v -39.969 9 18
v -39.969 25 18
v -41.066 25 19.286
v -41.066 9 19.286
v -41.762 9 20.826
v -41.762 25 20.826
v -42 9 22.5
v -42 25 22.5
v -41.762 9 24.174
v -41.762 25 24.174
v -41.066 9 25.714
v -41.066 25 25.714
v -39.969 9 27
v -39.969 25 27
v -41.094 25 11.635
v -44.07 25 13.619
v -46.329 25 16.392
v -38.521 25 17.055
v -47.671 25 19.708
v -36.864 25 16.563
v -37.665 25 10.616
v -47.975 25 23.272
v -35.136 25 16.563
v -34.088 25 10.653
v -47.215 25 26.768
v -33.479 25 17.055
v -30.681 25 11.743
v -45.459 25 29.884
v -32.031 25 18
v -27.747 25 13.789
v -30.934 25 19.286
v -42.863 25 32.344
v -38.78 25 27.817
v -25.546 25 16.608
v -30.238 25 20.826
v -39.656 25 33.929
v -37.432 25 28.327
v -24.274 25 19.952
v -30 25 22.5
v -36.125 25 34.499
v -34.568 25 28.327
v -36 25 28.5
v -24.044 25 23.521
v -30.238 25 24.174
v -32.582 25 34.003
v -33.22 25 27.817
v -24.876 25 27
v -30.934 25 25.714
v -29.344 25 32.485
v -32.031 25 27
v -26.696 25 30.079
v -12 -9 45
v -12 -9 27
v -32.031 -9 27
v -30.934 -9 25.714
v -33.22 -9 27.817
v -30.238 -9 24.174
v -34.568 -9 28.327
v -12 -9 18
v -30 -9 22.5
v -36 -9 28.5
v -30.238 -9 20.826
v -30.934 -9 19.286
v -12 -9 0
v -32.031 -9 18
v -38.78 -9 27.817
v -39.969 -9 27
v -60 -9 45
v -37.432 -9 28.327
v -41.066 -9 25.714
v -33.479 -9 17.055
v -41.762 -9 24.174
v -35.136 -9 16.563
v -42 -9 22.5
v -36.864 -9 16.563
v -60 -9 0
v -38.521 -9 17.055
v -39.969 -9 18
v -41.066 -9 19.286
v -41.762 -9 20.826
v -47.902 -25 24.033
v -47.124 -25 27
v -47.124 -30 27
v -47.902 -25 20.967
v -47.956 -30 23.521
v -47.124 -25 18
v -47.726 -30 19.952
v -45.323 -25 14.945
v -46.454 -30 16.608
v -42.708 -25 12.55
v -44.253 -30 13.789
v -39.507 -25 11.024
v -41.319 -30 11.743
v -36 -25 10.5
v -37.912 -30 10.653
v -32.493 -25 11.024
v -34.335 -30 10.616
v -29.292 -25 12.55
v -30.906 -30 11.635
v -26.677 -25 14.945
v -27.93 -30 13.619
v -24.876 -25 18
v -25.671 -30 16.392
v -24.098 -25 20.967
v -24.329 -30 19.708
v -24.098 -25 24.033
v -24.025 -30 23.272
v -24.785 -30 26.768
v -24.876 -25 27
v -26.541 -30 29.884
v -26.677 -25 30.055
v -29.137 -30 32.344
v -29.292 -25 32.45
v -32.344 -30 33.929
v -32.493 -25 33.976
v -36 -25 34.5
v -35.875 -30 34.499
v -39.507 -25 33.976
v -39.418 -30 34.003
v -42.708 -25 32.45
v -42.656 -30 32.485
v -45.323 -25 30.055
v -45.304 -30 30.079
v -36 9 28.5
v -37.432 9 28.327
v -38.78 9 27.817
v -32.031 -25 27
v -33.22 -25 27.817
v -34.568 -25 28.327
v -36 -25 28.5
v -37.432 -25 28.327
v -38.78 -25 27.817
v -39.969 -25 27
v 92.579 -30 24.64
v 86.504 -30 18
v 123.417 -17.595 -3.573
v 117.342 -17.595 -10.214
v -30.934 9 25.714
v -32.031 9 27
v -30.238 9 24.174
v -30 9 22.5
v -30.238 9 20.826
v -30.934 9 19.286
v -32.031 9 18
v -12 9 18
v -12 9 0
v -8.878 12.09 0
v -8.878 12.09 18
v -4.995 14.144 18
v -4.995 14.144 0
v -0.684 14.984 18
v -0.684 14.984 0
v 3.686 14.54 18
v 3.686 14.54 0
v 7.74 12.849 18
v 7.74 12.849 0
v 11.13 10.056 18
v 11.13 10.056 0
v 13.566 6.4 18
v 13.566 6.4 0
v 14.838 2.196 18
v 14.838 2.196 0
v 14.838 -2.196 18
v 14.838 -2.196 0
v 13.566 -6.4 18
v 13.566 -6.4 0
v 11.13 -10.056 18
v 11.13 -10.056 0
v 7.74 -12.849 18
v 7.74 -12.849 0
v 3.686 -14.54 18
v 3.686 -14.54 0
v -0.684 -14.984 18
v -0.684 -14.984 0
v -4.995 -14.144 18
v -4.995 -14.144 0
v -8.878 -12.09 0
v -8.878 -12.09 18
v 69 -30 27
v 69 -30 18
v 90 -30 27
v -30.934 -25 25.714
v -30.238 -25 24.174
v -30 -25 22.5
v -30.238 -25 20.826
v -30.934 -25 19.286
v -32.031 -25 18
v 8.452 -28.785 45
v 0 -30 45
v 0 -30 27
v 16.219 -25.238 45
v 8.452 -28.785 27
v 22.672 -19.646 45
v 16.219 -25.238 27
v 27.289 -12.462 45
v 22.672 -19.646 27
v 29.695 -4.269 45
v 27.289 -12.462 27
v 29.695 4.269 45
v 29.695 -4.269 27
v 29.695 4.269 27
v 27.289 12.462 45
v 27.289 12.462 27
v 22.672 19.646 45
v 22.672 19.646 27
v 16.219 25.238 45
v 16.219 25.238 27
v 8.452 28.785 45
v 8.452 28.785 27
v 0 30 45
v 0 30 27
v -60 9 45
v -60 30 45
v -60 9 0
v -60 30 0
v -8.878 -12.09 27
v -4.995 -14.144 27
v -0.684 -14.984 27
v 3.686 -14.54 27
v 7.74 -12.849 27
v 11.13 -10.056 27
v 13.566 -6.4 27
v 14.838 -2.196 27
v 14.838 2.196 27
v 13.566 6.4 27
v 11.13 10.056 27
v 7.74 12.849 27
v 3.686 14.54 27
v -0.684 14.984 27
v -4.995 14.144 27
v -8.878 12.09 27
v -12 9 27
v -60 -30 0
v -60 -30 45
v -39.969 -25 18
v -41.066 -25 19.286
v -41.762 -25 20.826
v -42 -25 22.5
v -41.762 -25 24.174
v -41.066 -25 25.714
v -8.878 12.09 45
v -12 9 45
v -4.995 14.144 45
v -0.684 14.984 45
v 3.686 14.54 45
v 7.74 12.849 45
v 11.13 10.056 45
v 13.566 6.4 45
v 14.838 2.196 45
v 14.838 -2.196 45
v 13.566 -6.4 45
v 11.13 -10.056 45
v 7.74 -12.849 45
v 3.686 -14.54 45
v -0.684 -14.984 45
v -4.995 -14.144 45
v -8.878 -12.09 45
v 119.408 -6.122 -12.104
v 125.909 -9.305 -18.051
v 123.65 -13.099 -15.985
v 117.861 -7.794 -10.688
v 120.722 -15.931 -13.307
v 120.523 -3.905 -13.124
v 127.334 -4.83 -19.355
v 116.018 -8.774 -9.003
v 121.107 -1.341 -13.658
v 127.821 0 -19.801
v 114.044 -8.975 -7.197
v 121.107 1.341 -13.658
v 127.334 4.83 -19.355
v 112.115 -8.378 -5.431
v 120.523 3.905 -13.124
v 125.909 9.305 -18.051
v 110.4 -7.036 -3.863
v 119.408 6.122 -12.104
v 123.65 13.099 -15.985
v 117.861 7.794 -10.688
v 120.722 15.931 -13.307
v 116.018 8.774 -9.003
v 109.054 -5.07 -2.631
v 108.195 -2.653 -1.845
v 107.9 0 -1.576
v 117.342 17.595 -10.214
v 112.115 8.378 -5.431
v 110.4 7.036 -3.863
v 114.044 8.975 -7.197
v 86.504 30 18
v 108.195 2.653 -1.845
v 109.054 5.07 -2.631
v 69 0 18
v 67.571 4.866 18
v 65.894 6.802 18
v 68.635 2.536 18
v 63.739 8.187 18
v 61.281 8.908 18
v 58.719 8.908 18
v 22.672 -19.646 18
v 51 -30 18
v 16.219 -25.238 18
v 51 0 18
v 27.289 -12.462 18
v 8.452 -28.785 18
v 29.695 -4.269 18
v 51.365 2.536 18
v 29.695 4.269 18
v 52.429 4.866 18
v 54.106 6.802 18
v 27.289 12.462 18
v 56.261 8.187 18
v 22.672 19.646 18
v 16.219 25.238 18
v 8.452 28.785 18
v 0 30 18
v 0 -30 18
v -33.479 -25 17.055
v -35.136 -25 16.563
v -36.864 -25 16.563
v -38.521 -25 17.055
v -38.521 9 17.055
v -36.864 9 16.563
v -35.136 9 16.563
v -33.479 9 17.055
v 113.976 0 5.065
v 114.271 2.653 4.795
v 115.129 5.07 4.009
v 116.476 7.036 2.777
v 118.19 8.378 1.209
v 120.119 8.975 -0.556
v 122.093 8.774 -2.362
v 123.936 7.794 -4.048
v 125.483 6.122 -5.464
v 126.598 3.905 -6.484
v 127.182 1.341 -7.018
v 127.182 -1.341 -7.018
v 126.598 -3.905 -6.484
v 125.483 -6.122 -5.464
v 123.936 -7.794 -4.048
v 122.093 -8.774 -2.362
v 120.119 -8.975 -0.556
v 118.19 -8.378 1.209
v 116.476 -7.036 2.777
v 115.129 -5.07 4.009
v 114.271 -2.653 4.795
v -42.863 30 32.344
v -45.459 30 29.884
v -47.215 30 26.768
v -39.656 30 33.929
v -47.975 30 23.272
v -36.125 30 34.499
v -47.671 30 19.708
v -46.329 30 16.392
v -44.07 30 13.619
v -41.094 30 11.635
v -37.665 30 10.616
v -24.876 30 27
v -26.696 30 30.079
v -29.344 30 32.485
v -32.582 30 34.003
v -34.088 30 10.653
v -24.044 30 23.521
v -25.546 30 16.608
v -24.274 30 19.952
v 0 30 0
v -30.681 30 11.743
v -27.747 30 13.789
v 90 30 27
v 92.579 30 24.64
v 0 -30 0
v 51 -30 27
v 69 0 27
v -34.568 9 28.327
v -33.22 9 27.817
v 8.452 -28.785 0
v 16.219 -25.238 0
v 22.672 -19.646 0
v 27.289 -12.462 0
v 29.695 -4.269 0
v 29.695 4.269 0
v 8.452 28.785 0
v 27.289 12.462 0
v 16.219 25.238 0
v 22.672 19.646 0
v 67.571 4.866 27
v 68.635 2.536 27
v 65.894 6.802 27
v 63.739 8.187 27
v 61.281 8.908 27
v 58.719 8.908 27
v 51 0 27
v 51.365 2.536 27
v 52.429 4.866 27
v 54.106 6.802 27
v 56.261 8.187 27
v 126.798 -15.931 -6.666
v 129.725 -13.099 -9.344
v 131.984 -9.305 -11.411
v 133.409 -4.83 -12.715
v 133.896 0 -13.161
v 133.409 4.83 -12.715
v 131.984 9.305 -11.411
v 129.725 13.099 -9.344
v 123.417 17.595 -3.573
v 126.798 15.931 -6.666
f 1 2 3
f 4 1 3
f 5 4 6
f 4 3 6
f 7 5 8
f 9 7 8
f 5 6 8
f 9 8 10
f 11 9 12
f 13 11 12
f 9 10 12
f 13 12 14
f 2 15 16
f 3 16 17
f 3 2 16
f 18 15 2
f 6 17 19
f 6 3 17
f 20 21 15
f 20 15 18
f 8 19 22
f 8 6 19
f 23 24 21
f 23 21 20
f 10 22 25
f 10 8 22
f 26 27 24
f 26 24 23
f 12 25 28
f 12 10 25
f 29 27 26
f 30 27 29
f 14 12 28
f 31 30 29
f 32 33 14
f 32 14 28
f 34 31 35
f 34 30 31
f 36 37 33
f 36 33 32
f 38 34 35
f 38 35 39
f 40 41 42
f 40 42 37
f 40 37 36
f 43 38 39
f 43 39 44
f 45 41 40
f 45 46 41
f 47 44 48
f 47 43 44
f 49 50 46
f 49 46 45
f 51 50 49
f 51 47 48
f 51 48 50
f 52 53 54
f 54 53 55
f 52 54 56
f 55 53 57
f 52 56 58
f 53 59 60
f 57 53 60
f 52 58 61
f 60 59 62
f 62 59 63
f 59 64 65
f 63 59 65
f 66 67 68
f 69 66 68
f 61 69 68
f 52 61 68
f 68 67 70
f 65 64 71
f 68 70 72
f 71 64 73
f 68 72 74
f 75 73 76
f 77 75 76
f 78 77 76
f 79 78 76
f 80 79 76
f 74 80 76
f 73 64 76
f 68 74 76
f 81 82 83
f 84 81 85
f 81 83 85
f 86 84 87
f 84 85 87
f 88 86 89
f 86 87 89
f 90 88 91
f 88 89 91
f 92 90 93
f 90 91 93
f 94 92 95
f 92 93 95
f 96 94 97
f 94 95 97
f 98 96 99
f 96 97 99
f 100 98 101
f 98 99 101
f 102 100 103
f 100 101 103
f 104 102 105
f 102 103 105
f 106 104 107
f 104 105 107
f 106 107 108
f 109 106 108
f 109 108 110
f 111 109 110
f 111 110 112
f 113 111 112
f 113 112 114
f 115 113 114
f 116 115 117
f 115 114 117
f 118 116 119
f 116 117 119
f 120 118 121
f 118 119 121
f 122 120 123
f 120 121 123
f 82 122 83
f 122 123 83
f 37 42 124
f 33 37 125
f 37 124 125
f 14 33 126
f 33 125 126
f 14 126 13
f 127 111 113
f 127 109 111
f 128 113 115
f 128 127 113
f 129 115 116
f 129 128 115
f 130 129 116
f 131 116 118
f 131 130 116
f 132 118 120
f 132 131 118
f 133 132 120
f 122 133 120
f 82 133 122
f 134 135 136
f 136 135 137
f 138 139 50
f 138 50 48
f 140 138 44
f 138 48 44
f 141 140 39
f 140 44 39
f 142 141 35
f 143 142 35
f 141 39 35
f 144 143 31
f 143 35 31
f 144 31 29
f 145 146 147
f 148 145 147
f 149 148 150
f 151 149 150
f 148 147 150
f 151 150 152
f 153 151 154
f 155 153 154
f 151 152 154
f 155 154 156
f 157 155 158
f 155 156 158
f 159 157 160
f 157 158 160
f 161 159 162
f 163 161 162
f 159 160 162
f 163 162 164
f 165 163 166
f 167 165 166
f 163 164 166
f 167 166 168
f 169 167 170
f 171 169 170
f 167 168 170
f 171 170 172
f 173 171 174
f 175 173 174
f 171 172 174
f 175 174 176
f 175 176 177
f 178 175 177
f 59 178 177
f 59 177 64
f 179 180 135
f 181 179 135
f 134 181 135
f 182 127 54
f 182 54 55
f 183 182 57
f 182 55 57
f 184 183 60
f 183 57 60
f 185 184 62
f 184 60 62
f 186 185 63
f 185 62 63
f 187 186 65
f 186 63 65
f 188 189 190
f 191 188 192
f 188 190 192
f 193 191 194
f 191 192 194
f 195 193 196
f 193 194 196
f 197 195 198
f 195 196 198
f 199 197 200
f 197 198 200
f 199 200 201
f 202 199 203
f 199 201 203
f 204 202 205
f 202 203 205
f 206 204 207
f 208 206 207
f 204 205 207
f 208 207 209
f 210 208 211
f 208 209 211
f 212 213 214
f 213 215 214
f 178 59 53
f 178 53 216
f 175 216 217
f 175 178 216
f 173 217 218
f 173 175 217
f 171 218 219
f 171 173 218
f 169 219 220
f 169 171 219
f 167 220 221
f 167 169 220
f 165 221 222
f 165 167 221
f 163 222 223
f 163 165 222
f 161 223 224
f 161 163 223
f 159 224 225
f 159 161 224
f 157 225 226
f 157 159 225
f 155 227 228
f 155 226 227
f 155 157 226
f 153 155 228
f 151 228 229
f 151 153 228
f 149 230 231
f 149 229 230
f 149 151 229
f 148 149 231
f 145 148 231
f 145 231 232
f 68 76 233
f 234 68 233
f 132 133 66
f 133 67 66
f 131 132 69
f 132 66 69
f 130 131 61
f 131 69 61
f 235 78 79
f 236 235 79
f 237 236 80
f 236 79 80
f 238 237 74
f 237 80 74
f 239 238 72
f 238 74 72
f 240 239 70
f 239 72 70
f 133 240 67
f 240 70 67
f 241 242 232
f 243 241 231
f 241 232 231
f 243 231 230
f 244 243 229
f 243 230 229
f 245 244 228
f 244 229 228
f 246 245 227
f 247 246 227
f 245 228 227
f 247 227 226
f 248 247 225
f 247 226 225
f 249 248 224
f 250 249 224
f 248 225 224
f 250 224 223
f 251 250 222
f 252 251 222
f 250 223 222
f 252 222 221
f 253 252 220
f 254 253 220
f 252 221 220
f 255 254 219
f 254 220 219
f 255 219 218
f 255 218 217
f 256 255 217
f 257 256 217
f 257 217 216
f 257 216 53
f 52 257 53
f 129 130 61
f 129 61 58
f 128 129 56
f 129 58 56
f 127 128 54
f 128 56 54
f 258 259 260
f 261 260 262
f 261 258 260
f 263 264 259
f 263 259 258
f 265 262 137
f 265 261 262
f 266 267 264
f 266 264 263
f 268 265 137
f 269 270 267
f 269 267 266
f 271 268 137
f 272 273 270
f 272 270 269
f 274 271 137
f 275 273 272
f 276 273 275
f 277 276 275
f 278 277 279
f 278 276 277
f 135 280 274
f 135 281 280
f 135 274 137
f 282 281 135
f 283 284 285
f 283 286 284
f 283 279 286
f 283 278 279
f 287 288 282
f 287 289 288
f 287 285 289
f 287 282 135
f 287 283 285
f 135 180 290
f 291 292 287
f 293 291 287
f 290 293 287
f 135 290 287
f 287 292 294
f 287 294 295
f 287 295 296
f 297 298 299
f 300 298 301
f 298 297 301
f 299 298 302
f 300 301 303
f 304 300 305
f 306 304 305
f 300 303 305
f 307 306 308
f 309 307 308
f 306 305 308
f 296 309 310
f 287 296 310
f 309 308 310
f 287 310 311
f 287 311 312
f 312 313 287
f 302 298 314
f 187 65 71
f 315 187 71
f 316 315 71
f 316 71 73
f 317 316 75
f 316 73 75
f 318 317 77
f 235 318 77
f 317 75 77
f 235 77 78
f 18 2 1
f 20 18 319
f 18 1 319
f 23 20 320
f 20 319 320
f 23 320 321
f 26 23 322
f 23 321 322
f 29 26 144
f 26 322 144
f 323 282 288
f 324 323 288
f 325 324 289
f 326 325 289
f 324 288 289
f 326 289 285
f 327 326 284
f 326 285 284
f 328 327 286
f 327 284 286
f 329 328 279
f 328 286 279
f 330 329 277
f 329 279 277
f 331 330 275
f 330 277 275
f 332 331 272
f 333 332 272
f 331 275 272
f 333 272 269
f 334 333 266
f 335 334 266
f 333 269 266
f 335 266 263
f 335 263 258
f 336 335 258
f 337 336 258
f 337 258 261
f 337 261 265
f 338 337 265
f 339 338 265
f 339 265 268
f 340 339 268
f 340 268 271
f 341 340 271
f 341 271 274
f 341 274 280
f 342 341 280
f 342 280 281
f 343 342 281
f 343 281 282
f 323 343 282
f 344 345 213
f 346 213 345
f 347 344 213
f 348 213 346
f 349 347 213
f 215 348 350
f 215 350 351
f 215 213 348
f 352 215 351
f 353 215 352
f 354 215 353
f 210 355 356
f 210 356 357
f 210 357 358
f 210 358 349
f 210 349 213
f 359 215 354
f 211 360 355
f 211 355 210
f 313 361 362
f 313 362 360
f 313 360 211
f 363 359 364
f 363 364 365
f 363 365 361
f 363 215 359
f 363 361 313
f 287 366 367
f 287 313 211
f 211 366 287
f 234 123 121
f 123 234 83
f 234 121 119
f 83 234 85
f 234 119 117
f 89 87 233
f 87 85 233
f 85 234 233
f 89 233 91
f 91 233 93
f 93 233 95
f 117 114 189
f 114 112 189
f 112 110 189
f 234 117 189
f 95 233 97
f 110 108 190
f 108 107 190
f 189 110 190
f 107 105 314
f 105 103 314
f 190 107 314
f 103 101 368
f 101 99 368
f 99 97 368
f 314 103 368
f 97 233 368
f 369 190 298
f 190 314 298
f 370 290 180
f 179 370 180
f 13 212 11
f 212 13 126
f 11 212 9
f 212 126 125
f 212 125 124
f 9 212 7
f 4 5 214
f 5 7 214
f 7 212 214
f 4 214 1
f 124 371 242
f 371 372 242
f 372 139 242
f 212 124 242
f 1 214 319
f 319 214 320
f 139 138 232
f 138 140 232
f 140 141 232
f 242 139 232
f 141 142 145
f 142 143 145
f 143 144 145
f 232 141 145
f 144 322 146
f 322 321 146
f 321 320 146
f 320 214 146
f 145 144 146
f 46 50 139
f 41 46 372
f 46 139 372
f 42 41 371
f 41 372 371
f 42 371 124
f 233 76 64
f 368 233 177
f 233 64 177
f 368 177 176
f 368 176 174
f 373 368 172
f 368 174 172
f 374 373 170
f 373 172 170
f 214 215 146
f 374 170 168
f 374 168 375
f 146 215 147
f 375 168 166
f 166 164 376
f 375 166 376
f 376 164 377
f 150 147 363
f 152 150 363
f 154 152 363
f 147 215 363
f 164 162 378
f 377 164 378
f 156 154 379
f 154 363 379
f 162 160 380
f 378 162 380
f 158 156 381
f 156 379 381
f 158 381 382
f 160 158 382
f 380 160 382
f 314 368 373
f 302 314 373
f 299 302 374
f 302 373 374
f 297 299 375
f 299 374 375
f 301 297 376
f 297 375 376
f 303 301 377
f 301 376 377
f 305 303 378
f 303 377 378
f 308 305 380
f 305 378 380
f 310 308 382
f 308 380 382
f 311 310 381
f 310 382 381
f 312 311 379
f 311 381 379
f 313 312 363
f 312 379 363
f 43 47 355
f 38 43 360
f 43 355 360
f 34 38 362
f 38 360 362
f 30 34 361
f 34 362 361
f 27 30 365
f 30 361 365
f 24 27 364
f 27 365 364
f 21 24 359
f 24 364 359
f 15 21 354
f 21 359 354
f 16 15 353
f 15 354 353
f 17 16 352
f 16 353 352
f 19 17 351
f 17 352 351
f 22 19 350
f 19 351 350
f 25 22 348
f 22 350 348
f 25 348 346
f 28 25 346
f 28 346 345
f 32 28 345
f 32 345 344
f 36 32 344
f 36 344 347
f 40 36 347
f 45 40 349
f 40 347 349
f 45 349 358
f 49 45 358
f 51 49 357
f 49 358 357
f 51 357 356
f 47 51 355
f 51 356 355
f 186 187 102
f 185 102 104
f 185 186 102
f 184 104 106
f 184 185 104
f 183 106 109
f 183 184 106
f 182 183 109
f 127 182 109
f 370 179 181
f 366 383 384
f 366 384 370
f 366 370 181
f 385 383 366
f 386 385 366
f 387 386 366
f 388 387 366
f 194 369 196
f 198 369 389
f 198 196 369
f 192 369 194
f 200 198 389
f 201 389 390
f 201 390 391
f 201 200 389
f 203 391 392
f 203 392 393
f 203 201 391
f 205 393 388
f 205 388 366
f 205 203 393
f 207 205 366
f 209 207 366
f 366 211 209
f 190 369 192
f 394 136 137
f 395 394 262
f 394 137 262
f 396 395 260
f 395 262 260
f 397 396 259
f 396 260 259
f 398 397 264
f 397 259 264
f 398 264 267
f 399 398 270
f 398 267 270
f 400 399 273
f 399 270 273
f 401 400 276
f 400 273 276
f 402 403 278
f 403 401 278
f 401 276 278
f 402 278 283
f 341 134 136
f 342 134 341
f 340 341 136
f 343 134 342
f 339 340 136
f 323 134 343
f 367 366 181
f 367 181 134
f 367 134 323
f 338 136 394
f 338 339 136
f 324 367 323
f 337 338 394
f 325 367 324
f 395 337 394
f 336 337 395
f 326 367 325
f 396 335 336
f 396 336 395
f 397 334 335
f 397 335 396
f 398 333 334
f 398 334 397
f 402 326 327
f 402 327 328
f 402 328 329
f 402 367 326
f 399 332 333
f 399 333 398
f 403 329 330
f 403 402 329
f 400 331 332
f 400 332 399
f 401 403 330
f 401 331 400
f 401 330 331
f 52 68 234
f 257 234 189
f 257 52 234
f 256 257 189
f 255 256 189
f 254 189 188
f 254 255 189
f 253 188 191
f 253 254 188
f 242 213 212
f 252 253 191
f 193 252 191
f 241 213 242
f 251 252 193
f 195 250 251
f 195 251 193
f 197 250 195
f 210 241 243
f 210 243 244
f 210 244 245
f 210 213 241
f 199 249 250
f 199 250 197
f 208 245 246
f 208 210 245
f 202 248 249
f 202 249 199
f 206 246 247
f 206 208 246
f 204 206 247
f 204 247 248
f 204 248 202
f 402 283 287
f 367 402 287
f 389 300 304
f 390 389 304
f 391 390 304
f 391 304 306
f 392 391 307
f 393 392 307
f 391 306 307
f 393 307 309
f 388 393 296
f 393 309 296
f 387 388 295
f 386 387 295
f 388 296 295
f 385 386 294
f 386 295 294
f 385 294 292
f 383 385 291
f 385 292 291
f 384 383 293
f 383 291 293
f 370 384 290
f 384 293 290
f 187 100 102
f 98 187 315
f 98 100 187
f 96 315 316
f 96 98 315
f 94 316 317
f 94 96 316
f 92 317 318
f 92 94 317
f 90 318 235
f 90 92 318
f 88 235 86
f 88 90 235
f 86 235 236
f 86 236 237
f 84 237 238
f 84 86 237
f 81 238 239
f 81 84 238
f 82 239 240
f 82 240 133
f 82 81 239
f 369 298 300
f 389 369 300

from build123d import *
from build123d.topology import SkipClean

# Parameters (mm, degrees)
BOSS_EXTRUDE1_DEPTH                      = 45
CBORE_FOR_M10_HEX_HEAD_BOLT1_D           = 12
CBORE_FOR_M10_HEX_HEAD_BOLT1_DEPTH       = 21
CBORE_FOR_M10_HEX_HEAD_BOLT1_CBORE_D     = 24
CBORE_FOR_M10_HEX_HEAD_BOLT1_CBORE_DEPTH = 5
CBORE_FOR_M10_HEX_HEAD_BOLT1_TIP         = 3.605163714
CBORE_FOR_M10_HEX_HEAD_BOLT2_D           = 12
CBORE_FOR_M10_HEX_HEAD_BOLT2_CBORE_D     = 24
CBORE_FOR_M10_HEX_HEAD_BOLT2_CBORE_DEPTH = 5
SKETCH8_W                                = 9
SKETCH8_H                                = 60
BOSS_EXTRUDE5_DEPTH                      = 150
SKETCH11_R                               = 12
CUT_EXTRUDE3_DEPTH                       = 5
SKETCH13_R                               = 6
CUT_EXTRUDE4_DEPTH                       = 99
SKETCH14_R                               = 12
CUT_EXTRUDE5_DEPTH                       = 5
CUT_EXTRUDE6_START                       = -68
CUT_EXTRUDE6_DEPTH                       = 68
BOSS_EXTRUDE8_DEPTH                      = 60
CUT_EXTRUDE7_DEPTH                       = 68
SKETCH18_R                               = 9
CUT_EXTRUDE8_DEPTH                       = 68
CUT_EXTRUDE9_DEPTH                       = 68


with BuildPart() as part:
    # Sketch1 → Boss-Extrude1 (new body)
    with BuildSketch(Plane.XY):
        with BuildLine():
            Line((0, 30), (-60, 30))
            Line((-60, 30), (-60, 9))
            Line((-60, 9), (-12, 9))
            ThreePointArc((-12, 9), (15, 0), (-12, -9))
            Line((-12, -9), (-60, -9))
            Line((-60, -9), (-60, -30))
            Line((-60, -30), (0, -30))
            ThreePointArc((0, -30), (30, 0), (0, 30))
        make_face()
    extrude(amount=BOSS_EXTRUDE1_DEPTH)

    # CBORE for M10 Hex Head Bolt1
    with Locations(Plane(origin=(0, 30, 0), x_dir=(1, 0, 0), z_dir=(0, 1, 0))):
        with Locations((-36, -22.5)):
            CounterBoreHole(CBORE_FOR_M10_HEX_HEAD_BOLT1_D / 2, CBORE_FOR_M10_HEX_HEAD_BOLT1_CBORE_D / 2, CBORE_FOR_M10_HEX_HEAD_BOLT1_CBORE_DEPTH, depth=CBORE_FOR_M10_HEX_HEAD_BOLT1_DEPTH)
            with Locations((0, 0, -(CBORE_FOR_M10_HEX_HEAD_BOLT1_DEPTH + CBORE_FOR_M10_HEX_HEAD_BOLT1_TIP / 2))):  # 118° drill point
                Cone(0, CBORE_FOR_M10_HEX_HEAD_BOLT1_D / 2, CBORE_FOR_M10_HEX_HEAD_BOLT1_TIP, mode=Mode.SUBTRACT)

    # CBORE for M10 Hex Head Bolt2 (through all)
    with Locations(Plane(origin=(0, -30, 0), x_dir=(-1, 0, 0), z_dir=(0, -1, 0))):
        with Locations((36, -22.5)):
            CounterBoreHole(CBORE_FOR_M10_HEX_HEAD_BOLT2_D / 2, CBORE_FOR_M10_HEX_HEAD_BOLT2_CBORE_D / 2, CBORE_FOR_M10_HEX_HEAD_BOLT2_CBORE_DEPTH)

    # Sketch8 → Boss-Extrude5 (add)
    with BuildSketch(Plane.ZY.offset(60)):
        with Locations((22.5, 0)):
            Rectangle(SKETCH8_W, SKETCH8_H)
    extrude(amount=-BOSS_EXTRUDE5_DEPTH)

    # Sketch11 → Cut-Extrude3 (cut)
    with BuildSketch(Plane(origin=(0, 30, 0), x_dir=(1, 0, 0), z_dir=(0, 1, 0))):
        with Locations(Location((-36, -22.5, 0), (0, 0, 270))):
            Circle(SKETCH11_R)
    extrude(amount=-CUT_EXTRUDE3_DEPTH, mode=Mode.SUBTRACT)

    # Sketch13 → Cut-Extrude4 (cut)
    with SkipClean():  # the faces are left unmerged after this step: merging them gives an invalid solid
        with BuildSketch(Plane(origin=(0, 30, 0), x_dir=(1, 0, 0), z_dir=(0, 1, 0))):
            with Locations(Location((-36, -22.5, 0), (0, 0, 270))):
                Circle(SKETCH13_R)
        extrude(amount=-CUT_EXTRUDE4_DEPTH, mode=Mode.SUBTRACT)

    # Sketch14 → Cut-Extrude5 (cut)
    with SkipClean():  # the faces are left unmerged after this step: merging them gives an invalid solid
        with BuildSketch(Plane.XZ.offset(30)):
            with Locations(Location((-36, 22.5, 0), (0, 0, 90))):
                Circle(SKETCH14_R)
        extrude(amount=-CUT_EXTRUDE5_DEPTH, mode=Mode.SUBTRACT)

    # Sketch15 → Cut-Extrude6 (cut)
    with BuildSketch(Plane.XY.offset(27).offset(CUT_EXTRUDE6_START)):
        with BuildLine():
            Line((-12, 9), (-60, 9))
            Line((-60, 9), (-60, -9))
            Line((-60, -9), (-12, -9))
            ThreePointArc((-12, -9), (15, 0), (-12, 9))
        make_face()
    extrude(amount=CUT_EXTRUDE6_DEPTH, mode=Mode.SUBTRACT)

    # Sketch16 → Boss-Extrude8 (add)
    with BuildSketch(Plane(origin=(0, 30, 0), x_dir=(1, 0, 0), z_dir=(0, 1, 0))):
        Polygon((90, -27), (134.636969371, 13.838596515), (128.561806253, 20.478806835), (83.924836882, -20.35978968), align=None)
    extrude(amount=-BOSS_EXTRUDE8_DEPTH)

    # Sketch17 → Cut-Extrude7 (cut)
    with BuildSketch(Plane(origin=(48.380075948, 0, 52.879877188), x_dir=(-0.7378011466347597, 0, 0.6750181242192198), z_dir=(-0.6750181242192198, 0, -0.7378011466347597))):
        with BuildLine():
            Line((-51.672504688, -30), (-93.46941491, -17.594984307))
            ThreePointArc((-93.46941491, -17.594984307), (-107.672504688, 0), (-93.46941491, 17.594984307))
            Line((-93.46941491, 17.594984307), (-51.672504688, 30))
            Line((-51.672504688, 30), (-131.97504834, 46.212798572))
            Line((-131.97504834, 46.212798572), (-125.335440866, -48.202419702))
            Line((-125.335440866, -48.202419702), (-41.145218102, -48.202419702))
            Line((-41.145218102, -48.202419702), (-51.672504688, -30))
        make_face()
    extrude(amount=-CUT_EXTRUDE7_DEPTH, mode=Mode.SUBTRACT)

    # Sketch18 → Cut-Extrude8 (cut)
    with BuildSketch(Plane(origin=(48.380075948, 0, 52.879877188), x_dir=(-0.7378011466347597, 0, 0.6750181242192198), z_dir=(-0.6750181242192198, 0, -0.7378011466347597))):
        with Locations((-89.672504688, 0)):
            Circle(SKETCH18_R)
    extrude(amount=-CUT_EXTRUDE8_DEPTH, mode=Mode.SUBTRACT)

    # Sketch19 → Cut-Extrude9 (cut)
    with BuildSketch(Plane(origin=(0, 0, 18), x_dir=(-1, 0, 0), z_dir=(0, 0, -1))):
        with BuildLine():
            Line((-69, 0), (-69, -30))
            Line((-69, -30), (-51, -30))
            Line((-51, -30), (-51, 0))
            ThreePointArc((-51, 0), (-60, 9), (-69, 0))
        make_face()
    extrude(amount=-CUT_EXTRUDE9_DEPTH, mode=Mode.SUBTRACT)


solid = part.part
